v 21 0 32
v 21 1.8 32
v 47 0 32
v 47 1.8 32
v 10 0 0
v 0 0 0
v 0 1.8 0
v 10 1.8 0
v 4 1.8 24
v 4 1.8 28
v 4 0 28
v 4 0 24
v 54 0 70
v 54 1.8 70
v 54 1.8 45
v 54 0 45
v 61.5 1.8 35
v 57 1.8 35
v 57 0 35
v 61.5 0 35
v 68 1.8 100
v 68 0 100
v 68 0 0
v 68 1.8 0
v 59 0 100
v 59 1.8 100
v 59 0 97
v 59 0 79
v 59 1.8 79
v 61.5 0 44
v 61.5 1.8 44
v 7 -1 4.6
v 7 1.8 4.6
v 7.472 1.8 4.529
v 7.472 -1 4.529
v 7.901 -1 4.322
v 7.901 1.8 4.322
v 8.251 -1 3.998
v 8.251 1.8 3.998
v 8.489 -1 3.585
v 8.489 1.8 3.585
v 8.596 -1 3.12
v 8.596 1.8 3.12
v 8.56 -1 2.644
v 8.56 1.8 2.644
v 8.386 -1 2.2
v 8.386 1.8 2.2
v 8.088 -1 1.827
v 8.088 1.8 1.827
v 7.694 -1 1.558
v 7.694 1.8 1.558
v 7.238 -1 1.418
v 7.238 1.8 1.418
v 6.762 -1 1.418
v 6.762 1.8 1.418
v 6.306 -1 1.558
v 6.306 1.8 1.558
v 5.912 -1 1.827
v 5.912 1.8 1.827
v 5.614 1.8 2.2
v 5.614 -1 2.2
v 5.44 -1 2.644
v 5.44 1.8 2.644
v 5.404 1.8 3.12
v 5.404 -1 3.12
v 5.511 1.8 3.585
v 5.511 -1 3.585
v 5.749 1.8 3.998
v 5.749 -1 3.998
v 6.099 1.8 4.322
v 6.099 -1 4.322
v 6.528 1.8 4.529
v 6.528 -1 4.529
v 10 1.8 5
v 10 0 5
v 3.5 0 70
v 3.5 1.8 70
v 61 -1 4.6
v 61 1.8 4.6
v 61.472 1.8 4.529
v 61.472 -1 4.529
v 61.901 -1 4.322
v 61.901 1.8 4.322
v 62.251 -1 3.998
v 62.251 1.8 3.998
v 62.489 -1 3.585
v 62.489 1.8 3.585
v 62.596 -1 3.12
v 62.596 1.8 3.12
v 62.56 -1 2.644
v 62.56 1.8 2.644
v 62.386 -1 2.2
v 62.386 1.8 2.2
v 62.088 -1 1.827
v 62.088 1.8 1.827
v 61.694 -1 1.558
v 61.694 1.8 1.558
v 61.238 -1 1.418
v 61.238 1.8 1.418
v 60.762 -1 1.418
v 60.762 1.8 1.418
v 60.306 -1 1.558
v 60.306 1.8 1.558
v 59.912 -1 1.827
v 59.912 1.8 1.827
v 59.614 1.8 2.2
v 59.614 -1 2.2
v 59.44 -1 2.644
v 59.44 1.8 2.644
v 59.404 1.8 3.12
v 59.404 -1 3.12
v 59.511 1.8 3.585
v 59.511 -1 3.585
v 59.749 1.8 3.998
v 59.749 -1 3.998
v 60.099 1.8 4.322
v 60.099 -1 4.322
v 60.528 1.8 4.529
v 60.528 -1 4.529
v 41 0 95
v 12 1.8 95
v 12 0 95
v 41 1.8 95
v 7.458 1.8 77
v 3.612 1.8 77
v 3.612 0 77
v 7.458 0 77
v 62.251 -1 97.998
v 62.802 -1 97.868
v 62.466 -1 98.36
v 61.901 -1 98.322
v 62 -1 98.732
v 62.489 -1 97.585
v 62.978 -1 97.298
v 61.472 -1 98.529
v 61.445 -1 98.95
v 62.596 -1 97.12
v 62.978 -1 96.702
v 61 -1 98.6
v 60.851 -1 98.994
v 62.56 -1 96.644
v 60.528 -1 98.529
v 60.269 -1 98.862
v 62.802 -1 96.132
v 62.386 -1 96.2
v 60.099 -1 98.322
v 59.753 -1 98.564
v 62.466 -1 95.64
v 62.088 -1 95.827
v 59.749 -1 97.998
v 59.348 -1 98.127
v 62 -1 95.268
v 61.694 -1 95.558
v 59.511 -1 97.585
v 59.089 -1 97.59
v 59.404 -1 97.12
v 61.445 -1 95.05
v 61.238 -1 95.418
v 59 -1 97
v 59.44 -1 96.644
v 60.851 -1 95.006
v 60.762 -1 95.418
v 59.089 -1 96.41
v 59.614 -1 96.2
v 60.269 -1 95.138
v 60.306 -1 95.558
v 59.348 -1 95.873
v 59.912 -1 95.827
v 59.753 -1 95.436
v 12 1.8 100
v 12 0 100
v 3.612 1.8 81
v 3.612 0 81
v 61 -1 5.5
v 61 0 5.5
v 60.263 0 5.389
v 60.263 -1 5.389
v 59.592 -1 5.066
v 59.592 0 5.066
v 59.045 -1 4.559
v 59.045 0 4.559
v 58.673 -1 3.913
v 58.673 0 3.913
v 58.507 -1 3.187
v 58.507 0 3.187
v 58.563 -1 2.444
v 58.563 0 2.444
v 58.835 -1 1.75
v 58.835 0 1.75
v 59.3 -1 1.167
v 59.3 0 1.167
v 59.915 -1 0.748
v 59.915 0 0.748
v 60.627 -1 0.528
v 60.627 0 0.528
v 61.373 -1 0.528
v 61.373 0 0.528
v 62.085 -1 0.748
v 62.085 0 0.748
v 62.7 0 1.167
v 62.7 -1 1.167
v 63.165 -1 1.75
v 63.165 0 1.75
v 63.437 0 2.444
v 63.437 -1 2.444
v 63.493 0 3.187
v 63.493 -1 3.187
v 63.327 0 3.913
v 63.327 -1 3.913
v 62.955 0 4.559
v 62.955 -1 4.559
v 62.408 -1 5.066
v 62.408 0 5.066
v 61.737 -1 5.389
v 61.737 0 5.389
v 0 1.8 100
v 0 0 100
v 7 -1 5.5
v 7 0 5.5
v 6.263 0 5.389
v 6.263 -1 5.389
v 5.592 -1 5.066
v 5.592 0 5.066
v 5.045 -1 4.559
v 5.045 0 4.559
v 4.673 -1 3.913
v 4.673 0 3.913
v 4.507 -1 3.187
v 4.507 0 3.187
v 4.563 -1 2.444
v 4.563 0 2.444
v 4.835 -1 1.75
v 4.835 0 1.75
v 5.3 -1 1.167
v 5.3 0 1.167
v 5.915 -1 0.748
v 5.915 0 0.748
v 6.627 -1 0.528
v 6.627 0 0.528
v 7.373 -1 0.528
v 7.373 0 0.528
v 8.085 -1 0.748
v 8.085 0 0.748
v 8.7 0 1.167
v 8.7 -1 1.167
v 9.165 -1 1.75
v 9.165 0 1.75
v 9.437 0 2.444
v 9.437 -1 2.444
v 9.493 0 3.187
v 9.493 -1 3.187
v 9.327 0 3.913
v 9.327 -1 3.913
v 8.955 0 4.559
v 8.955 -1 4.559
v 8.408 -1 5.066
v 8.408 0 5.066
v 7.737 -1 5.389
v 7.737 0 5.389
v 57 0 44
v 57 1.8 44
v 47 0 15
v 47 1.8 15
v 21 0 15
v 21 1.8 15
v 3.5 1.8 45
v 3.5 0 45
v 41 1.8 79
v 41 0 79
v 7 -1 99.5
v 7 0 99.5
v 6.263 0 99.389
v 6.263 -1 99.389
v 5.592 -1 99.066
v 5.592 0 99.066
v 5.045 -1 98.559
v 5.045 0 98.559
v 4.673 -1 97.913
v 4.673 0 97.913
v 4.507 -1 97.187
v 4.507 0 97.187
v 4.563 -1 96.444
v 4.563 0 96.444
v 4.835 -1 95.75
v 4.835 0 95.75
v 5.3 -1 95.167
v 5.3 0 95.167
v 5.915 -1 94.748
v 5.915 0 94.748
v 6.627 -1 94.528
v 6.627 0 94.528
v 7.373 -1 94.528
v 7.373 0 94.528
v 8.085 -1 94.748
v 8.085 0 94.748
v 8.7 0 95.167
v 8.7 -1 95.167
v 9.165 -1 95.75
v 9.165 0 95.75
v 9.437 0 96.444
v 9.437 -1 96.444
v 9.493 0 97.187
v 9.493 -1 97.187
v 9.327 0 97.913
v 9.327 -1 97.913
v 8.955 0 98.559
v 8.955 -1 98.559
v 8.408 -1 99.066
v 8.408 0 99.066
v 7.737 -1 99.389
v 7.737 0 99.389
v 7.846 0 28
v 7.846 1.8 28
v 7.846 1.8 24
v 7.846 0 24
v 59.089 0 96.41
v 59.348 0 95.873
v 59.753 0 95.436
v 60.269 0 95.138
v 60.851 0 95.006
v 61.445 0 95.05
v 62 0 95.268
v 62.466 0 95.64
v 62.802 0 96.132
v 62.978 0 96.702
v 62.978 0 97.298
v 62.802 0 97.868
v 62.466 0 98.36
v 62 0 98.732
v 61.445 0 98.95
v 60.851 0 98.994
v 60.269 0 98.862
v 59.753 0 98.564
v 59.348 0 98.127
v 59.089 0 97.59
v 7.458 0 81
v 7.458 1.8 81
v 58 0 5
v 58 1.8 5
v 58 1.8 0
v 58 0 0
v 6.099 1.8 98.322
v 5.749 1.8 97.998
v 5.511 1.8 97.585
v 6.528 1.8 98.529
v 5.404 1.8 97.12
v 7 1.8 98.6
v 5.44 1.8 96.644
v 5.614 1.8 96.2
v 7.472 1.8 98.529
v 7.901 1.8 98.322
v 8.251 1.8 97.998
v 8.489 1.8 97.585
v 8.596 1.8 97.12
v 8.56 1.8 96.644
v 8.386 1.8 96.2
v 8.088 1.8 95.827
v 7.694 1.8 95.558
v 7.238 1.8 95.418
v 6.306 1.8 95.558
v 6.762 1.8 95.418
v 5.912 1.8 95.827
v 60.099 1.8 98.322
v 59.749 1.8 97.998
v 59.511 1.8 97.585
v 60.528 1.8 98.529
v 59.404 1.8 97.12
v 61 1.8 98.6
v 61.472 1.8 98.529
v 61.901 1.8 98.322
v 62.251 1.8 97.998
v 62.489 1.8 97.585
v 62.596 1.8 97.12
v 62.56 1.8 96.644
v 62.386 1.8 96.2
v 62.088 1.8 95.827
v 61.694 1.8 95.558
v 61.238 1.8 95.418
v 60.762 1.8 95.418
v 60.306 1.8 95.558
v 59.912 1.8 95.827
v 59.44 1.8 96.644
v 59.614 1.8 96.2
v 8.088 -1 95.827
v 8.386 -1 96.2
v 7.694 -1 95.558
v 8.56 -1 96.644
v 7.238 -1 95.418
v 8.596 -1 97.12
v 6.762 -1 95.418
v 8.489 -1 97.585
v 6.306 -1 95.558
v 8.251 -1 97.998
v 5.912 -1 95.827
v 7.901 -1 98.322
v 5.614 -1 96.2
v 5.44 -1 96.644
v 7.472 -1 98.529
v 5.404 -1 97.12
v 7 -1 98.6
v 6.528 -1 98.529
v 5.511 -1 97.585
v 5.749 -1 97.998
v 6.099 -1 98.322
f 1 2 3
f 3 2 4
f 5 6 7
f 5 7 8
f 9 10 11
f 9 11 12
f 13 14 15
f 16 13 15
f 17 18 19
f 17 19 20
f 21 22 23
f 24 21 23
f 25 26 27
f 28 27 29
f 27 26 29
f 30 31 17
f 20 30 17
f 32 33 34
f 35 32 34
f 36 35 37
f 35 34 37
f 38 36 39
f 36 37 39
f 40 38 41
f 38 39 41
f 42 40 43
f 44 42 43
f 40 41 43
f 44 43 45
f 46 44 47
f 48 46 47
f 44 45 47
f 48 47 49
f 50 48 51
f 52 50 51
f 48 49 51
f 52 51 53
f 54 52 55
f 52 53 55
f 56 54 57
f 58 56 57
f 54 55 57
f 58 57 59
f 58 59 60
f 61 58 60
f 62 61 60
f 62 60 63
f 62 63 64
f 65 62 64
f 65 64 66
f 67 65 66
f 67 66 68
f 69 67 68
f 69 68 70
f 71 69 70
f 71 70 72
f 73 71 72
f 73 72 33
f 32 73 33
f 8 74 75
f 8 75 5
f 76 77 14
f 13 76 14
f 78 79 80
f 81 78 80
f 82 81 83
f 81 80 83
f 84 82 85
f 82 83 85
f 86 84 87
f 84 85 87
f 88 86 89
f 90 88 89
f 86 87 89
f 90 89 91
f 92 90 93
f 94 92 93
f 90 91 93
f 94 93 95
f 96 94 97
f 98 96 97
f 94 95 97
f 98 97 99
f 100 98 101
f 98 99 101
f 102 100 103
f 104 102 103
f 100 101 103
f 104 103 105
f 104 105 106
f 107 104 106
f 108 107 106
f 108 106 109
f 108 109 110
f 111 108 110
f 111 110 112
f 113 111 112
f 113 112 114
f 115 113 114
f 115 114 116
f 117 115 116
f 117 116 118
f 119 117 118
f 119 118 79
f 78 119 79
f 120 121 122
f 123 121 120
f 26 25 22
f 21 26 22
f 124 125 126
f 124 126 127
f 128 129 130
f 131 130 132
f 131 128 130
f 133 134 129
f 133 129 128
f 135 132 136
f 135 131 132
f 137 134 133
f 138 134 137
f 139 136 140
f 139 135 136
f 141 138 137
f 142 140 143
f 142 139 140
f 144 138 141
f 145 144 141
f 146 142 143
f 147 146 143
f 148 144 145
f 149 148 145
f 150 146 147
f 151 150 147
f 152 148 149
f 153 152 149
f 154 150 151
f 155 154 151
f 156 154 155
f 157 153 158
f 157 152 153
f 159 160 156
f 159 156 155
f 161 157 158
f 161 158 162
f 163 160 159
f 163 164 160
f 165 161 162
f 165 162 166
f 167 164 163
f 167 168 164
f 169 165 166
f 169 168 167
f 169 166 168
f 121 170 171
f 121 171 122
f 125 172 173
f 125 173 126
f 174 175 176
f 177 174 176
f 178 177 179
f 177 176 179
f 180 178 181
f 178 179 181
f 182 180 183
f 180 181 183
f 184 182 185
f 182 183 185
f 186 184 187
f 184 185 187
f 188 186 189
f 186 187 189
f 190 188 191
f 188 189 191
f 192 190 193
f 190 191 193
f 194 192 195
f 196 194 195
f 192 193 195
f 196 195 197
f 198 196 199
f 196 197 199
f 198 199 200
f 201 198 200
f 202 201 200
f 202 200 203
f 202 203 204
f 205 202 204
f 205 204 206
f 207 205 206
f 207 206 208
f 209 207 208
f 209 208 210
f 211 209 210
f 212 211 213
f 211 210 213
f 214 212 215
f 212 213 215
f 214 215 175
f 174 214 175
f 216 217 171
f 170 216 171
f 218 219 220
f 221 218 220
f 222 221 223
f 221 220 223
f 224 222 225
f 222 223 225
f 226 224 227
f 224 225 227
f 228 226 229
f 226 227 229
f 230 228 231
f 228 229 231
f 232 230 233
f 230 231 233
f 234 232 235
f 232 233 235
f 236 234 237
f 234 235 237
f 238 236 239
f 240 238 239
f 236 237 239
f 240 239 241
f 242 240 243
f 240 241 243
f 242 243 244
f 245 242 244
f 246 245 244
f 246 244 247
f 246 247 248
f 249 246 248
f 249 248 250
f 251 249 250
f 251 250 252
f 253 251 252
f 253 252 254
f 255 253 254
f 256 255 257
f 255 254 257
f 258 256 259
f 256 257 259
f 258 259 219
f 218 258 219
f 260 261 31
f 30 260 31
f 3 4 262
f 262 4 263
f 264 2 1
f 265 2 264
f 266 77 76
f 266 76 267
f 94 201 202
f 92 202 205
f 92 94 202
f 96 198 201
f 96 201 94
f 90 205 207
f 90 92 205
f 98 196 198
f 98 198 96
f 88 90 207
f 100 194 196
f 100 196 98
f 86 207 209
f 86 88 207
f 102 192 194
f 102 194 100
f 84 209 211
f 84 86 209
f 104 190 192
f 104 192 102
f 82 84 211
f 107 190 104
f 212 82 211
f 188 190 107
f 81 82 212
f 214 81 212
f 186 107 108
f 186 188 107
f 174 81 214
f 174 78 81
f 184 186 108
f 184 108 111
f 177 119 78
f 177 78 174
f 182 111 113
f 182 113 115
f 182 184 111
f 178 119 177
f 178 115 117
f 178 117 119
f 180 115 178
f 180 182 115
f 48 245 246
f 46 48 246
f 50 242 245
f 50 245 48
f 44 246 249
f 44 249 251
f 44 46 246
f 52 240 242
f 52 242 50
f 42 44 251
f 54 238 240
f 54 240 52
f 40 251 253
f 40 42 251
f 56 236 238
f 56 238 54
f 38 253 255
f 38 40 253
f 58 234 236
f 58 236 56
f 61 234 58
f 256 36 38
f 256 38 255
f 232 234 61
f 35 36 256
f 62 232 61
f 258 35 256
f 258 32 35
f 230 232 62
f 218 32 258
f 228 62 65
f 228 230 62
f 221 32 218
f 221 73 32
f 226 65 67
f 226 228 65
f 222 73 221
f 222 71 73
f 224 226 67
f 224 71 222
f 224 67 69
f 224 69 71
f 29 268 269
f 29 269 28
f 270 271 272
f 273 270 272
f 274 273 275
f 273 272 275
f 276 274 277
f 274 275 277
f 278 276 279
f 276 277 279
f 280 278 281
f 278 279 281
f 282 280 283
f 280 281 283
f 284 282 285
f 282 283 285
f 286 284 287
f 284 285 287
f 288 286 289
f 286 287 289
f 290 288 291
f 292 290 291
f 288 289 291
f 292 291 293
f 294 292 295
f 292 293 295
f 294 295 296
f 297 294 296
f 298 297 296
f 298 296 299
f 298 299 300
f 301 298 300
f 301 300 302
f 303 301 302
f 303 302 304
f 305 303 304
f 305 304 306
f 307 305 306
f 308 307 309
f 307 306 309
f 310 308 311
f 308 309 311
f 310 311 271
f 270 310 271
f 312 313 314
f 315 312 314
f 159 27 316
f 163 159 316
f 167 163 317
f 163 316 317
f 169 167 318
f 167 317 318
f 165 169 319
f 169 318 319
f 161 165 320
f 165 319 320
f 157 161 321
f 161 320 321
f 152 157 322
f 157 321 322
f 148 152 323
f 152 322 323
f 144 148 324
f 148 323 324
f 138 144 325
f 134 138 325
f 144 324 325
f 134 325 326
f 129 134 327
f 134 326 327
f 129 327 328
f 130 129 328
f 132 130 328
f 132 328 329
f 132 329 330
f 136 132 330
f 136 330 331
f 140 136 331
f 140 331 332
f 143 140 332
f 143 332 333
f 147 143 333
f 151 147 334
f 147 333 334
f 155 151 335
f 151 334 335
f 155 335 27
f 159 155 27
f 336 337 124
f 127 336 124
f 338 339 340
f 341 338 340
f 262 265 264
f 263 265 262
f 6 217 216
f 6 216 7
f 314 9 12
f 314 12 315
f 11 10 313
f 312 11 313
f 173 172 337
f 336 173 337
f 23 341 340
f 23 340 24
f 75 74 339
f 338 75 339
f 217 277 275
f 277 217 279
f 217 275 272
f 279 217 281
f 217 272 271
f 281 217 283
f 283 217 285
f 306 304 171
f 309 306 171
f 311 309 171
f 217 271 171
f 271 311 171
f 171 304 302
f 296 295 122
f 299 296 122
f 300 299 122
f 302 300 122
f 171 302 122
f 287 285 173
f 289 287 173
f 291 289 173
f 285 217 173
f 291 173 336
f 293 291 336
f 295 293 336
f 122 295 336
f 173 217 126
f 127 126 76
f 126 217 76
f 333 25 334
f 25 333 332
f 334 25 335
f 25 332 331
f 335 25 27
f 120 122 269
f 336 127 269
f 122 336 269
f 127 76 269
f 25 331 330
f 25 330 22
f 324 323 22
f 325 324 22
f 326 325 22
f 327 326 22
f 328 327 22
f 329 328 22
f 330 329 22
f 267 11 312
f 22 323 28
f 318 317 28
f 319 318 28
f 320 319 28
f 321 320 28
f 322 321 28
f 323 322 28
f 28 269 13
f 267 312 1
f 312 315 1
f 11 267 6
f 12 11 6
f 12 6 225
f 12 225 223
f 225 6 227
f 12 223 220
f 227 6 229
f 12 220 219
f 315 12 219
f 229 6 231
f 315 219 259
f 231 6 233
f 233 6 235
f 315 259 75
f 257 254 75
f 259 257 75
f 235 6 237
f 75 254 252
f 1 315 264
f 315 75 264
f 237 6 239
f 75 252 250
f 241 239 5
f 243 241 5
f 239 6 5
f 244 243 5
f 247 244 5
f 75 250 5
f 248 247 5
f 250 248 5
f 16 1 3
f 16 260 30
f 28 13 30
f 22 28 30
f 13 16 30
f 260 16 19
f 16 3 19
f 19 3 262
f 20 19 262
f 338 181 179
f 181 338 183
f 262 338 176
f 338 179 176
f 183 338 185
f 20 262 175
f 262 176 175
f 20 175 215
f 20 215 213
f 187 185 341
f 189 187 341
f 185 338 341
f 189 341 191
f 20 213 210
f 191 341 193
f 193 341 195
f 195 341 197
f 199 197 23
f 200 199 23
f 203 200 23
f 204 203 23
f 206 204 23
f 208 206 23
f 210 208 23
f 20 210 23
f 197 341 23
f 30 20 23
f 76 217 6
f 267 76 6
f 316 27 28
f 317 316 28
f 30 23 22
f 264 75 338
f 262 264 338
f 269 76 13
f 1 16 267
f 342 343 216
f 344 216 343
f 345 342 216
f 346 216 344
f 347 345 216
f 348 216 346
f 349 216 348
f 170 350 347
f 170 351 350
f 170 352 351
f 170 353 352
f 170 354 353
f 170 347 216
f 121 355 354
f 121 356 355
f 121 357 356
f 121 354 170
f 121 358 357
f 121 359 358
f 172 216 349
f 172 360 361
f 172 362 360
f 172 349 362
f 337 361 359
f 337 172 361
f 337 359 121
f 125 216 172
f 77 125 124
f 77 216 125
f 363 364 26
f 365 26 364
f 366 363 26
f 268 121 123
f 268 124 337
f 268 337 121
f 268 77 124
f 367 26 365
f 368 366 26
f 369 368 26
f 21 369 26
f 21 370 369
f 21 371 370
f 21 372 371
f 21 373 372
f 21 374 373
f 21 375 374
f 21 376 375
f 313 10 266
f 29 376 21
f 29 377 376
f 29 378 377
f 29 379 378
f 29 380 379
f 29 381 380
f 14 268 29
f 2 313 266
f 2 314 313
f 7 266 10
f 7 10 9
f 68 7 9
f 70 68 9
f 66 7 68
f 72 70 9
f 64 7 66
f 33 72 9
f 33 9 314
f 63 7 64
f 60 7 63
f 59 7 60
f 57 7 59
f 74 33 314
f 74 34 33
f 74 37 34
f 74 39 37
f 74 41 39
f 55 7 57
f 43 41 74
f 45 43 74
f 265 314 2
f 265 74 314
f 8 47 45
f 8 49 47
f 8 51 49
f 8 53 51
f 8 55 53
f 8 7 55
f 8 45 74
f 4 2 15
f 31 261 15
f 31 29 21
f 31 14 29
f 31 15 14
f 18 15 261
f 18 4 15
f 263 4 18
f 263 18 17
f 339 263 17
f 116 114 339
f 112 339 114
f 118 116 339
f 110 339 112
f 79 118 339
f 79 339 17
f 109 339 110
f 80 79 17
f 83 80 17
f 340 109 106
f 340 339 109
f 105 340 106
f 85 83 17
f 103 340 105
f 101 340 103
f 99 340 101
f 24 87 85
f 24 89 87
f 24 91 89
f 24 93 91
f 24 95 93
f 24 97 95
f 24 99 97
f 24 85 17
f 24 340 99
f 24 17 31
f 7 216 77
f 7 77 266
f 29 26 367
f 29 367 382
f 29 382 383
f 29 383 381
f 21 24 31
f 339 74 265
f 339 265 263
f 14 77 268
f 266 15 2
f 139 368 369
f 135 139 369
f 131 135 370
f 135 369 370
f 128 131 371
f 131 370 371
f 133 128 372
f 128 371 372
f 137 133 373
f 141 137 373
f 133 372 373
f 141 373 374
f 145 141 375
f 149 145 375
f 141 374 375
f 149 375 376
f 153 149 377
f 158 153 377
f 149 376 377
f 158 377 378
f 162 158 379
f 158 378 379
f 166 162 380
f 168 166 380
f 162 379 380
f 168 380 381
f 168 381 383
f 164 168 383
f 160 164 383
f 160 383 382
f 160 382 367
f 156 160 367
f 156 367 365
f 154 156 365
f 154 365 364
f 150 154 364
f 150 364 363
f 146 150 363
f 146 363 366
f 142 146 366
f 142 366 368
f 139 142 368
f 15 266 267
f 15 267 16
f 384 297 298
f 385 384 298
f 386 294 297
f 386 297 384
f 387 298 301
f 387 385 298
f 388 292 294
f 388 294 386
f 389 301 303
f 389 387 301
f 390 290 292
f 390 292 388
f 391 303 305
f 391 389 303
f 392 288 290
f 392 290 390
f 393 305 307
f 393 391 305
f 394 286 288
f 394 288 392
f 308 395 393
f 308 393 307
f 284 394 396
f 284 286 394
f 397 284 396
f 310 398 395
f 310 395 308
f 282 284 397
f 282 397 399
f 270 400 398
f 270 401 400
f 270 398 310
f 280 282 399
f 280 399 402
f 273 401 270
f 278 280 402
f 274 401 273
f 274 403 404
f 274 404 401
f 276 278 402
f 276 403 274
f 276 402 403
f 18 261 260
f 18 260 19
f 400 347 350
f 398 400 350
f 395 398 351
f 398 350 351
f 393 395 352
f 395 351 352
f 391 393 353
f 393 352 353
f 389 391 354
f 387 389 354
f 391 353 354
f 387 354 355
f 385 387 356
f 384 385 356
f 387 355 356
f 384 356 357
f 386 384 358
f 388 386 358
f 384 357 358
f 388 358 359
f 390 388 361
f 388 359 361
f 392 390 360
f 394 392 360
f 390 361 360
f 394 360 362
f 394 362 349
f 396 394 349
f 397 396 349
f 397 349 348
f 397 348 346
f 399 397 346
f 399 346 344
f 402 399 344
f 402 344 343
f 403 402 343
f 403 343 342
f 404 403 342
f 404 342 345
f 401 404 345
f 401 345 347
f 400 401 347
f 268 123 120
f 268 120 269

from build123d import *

# Parameters (mm, degrees)
SKETCH_1_W          = 68
SKETCH_1_H          = 100
EXTRUDE_1_DEPTH     = 1.8
SKETCH_2_W          = 48
SKETCH_2_H          = 5
SKETCH_2_W_2        = 26
SKETCH_2_H_2        = 17
SKETCH_2_W_3        = 3.846350714
SKETCH_2_H_3        = 4
SKETCH_2_W_4        = 50.5
SKETCH_2_H_4        = 25
SKETCH_2_W_5        = 24
SKETCH_2_W_6        = 18
SKETCH_2_H_5        = 16.79174546
SKETCH_2_W_7        = 4.5
SKETCH_2_H_6        = 9
CUT_EXTRUDE_1_DEPTH = 1.8
SKETCH_4_R          = 2.5
SKETCH_4_R_2        = 1.4
SKETCH_4_R_3        = 2
EXTRUDE_3_DEPTH     = 1
CUT_EXTRUDE_START   = -14
SKETCH_6_R          = 1.4
CUT_EXTRUDE_3_DEPTH = 14
SKETCH_8_W          = 5
SKETCH_8_H          = 5
SKETCH_8_W_2        = 18
SKETCH_8_H_2        = 4.20825454
CUT_EXTRUDE_4_DEPTH = 10
SKETCH_9_R          = 1.6
CUT_EXTRUDE_5_DEPTH = 10


with BuildPart() as part:
    # 草图1 → 凸台-拉伸1 (new body)
    with BuildSketch(Plane(origin=(0, 0, 0), x_dir=(1, 0, 0), z_dir=(0, 1, 0))):
        with Locations((34, -50)):
            Rectangle(SKETCH_1_W, SKETCH_1_H)
    extrude(amount=EXTRUDE_1_DEPTH)

    # 草图2 → 切除-拉伸1 (cut)
    with BuildSketch(Plane(origin=(0, 1.8, 0), x_dir=(1, 0, 0), z_dir=(0, 1, 0))):
        with Locations((34, -2.5)):
            Rectangle(SKETCH_2_W, SKETCH_2_H)
        with Locations((34, -23.5)):
            Rectangle(SKETCH_2_W_2, SKETCH_2_H_2)
        with Locations((5.923175357, -26)):
            Rectangle(SKETCH_2_W_3, SKETCH_2_H_3)
        with Locations((5.535050967, -79)):
            Rectangle(SKETCH_2_W_3, SKETCH_2_H_3)
        with Locations((28.75, -57.5)):
            Rectangle(SKETCH_2_W_4, SKETCH_2_H_4)
        with Locations((24, -97.5)):
            Rectangle(SKETCH_2_W_5, SKETCH_2_H)
        with Locations((50, -91.60412727)):
            Rectangle(SKETCH_2_W_6, SKETCH_2_H_5)
        with Locations((59.25, -39.5)):
            Rectangle(SKETCH_2_W_7, SKETCH_2_H_6)
    extrude(amount=-CUT_EXTRUDE_1_DEPTH, mode=Mode.SUBTRACT)

    # 草图4 → 凸台-拉伸3 (add)
    # profile 1 of 4: a face of its own
    with BuildSketch(Plane.XZ):
        with Locations(Location((7, 97, 0), (0, 0, 90))):
            Circle(SKETCH_4_R)
        with Locations(Location((7, 97, 0), (0, 0, 270))):
            Circle(SKETCH_4_R_2, mode=Mode.SUBTRACT)
    # profile 2 of 4: a face of its own
    with BuildSketch(Plane.XZ):
        with Locations(Location((61, 97, 0), (0, 0, 180))):
            Circle(SKETCH_4_R_3)
        with Locations(Location((61, 97, 0), (0, 0, 270))):
            Circle(SKETCH_4_R_2, mode=Mode.SUBTRACT)
    # profile 3 of 4: a face of its own
    with BuildSketch(Plane.XZ):
        with Locations(Location((61, 3, 0), (0, 0, 90))):
            Circle(SKETCH_4_R)
        with Locations(Location((61, 3, 0), (0, 0, 270))):
            Circle(SKETCH_4_R_2, mode=Mode.SUBTRACT)
    # profile 4 of 4: a face of its own
    with BuildSketch(Plane.XZ):
        with Locations(Location((7, 3, 0), (0, 0, 90))):
            Circle(SKETCH_4_R)
        with Locations(Location((7, 3, 0), (0, 0, 270))):
            Circle(SKETCH_4_R_2, mode=Mode.SUBTRACT)
    extrude(amount=EXTRUDE_3_DEPTH)

    # 草图6 → 切除-拉伸3 (cut)
    with BuildSketch(Plane.XZ.offset(CUT_EXTRUDE_START)):
        with Locations(Location((7, 97, 0), (0, 0, 90))):
            Circle(SKETCH_6_R)
        with Locations(Location((61, 97, 0), (0, 0, 90))):
            Circle(SKETCH_6_R)
        with Locations(Location((61, 3, 0), (0, 0, 90))):
            Circle(SKETCH_6_R)
        with Locations(Location((7, 3, 0), (0, 0, 90))):
            Circle(SKETCH_6_R)
    extrude(amount=CUT_EXTRUDE_3_DEPTH, mode=Mode.SUBTRACT)

    # 草图8 → 切除-拉伸4 (cut)
    with BuildSketch(Plane(origin=(0, 1.8, 0), x_dir=(1, 0, 0), z_dir=(0, 1, 0))):
        with Locations((38.5, -97.5)):
            Rectangle(SKETCH_8_W, SKETCH_8_H)
        with Locations((50, -81.10412727)):
            Rectangle(SKETCH_8_W_2, SKETCH_8_H_2)
    extrude(amount=-CUT_EXTRUDE_4_DEPTH, mode=Mode.SUBTRACT)

    # 草图9 → 切除-拉伸5 (cut)
    with BuildSketch(Plane(origin=(0, 1.8, 0), x_dir=(1, 0, 0), z_dir=(0, 1, 0))):
        with Locations(Location((7, -3, 0), (0, 0, 270))):
            Circle(SKETCH_9_R)
        with Locations(Location((61, -3, 0), (0, 0, 270))):
            Circle(SKETCH_9_R)
        with Locations(Location((61, -97, 0), (0, 0, 270))):
            Circle(SKETCH_9_R)
        with Locations(Location((7, -97, 0), (0, 0, 270))):
            Circle(SKETCH_9_R)
    extrude(amount=-CUT_EXTRUDE_5_DEPTH, mode=Mode.SUBTRACT)


solid = part.part
